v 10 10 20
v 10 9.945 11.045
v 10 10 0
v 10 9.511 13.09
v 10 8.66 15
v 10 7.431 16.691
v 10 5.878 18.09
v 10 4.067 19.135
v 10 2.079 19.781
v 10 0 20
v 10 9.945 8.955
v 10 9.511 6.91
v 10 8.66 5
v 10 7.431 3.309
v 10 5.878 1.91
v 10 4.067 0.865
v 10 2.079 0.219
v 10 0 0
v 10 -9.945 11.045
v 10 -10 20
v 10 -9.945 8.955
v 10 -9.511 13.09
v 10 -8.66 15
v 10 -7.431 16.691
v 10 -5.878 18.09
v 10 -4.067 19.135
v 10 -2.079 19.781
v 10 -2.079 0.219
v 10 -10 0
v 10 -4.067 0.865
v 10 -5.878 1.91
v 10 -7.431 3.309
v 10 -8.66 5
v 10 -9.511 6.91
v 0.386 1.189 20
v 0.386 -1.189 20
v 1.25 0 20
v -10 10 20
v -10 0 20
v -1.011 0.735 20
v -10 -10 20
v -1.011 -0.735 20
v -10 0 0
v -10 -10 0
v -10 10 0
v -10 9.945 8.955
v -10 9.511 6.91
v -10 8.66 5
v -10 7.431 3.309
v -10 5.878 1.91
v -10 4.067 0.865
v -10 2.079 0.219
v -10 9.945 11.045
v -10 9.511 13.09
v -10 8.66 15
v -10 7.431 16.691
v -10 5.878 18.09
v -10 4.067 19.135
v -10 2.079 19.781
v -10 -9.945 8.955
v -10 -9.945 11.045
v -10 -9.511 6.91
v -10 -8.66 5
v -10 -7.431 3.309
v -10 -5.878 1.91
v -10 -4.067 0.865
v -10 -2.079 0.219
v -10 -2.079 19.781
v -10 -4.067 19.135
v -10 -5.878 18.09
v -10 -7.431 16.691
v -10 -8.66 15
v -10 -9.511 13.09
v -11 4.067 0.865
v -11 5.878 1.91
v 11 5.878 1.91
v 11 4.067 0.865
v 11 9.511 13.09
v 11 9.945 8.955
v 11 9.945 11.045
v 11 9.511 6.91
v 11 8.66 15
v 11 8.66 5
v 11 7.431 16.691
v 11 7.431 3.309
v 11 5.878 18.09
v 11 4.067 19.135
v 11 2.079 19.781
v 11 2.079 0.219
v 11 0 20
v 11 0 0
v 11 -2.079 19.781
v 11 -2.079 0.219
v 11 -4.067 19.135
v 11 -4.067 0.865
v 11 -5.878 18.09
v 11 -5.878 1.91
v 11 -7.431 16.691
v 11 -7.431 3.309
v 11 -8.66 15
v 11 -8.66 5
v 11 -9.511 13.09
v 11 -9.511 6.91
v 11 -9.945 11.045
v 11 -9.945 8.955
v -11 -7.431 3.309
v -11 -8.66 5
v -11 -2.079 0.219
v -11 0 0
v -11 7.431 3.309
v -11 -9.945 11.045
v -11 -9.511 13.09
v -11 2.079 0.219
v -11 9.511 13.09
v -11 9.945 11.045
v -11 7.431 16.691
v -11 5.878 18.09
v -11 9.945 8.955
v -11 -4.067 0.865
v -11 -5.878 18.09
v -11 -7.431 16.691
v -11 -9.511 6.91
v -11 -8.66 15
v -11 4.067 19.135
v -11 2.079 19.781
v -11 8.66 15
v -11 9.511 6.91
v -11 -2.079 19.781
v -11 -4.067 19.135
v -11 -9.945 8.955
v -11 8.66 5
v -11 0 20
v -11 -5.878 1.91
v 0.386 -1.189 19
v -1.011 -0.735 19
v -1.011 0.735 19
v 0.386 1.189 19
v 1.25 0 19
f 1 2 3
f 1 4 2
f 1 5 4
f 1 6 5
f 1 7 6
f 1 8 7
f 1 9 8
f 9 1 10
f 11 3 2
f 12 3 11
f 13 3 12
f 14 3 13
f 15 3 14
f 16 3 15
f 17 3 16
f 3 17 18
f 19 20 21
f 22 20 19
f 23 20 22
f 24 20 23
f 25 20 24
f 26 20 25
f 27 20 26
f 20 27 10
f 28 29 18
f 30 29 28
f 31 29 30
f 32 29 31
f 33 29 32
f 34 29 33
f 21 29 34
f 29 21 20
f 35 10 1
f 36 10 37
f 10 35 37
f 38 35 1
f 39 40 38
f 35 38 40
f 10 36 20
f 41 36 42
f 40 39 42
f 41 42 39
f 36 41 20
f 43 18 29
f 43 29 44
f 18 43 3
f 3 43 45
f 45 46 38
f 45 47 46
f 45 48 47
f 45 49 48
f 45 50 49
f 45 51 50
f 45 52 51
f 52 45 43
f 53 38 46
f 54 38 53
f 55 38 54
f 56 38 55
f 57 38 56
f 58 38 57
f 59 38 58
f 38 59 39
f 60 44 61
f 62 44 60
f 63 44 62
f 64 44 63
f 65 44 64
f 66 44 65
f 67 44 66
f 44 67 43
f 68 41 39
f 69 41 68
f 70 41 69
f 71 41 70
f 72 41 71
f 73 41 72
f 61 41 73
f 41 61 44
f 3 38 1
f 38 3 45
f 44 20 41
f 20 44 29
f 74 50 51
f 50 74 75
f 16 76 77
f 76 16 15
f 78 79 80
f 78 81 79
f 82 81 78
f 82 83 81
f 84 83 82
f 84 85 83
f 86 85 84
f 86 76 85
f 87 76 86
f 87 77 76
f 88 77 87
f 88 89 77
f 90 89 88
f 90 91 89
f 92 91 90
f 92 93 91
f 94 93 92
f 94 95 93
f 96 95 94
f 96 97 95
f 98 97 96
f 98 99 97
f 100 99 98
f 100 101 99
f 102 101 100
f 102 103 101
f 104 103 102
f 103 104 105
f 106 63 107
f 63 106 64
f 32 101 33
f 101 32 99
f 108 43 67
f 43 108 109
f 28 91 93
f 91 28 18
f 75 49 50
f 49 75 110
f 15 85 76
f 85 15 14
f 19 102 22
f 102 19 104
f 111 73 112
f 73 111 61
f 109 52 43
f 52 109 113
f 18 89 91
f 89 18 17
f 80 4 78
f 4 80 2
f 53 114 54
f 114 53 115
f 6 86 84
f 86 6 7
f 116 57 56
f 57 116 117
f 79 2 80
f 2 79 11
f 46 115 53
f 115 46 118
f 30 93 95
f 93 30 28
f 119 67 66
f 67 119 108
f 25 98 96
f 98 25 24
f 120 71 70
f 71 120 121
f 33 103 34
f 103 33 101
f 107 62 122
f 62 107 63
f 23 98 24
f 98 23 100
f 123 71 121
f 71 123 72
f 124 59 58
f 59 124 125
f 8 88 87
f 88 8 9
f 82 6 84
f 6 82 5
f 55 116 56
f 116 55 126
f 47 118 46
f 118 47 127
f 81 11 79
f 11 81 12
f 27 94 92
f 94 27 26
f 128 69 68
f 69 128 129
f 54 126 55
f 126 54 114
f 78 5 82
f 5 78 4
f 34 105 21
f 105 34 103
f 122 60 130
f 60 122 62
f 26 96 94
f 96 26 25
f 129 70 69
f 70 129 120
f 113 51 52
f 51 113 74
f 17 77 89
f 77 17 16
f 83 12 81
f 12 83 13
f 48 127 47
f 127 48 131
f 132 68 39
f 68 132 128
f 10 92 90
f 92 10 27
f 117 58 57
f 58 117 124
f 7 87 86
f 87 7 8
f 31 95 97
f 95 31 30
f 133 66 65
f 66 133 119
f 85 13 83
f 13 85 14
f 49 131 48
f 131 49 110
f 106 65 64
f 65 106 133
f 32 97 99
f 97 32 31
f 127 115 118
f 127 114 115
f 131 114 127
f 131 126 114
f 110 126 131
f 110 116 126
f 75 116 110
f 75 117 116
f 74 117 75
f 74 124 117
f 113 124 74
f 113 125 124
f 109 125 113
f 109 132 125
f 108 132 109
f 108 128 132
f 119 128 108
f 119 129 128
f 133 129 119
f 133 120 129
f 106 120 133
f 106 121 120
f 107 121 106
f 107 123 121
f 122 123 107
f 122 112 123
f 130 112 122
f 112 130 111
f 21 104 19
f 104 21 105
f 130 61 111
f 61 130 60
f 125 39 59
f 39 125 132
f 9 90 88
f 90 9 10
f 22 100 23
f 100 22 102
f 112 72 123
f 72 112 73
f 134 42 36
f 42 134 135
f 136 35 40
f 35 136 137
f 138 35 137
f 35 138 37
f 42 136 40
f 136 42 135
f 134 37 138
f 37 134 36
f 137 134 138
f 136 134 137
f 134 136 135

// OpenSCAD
cube_size = 20; // [10:Small,20:Medium,30:Large]

hole_diameter = 2.5;
hole_radius = hole_diameter/2;

// How deep should the center hole be?
hole_depth = 1; // [0,1,5,50]

show_wheels = "yes"; // [yes,no]

// How thick should the side wheels be?
wheel_thickness = 1; // [1:20]

// ignore this variable!
// foo=1;

// don't turn functions into params!
function BEZ03(u) = pow((1-u), 3);

// ignore variable values
bing = 3+4;
baz = 3 / hole_depth;

difference() {
  union() {
    translate([0, 0, cube_size/2]) cube([cube_size,cube_size,cube_size], center=true);
    if (show_wheels == "yes") {
      translate([0, 0, cube_size/2]) rotate([0, 90, 0]) {
        cylinder(r=cube_size/2, h=cube_size+(wheel_thickness*2), center=true);
      }
    }
  }
  translate([0, 0, cube_size-hole_depth]) cylinder(r=hole_radius, h=hole_depth);
}          
